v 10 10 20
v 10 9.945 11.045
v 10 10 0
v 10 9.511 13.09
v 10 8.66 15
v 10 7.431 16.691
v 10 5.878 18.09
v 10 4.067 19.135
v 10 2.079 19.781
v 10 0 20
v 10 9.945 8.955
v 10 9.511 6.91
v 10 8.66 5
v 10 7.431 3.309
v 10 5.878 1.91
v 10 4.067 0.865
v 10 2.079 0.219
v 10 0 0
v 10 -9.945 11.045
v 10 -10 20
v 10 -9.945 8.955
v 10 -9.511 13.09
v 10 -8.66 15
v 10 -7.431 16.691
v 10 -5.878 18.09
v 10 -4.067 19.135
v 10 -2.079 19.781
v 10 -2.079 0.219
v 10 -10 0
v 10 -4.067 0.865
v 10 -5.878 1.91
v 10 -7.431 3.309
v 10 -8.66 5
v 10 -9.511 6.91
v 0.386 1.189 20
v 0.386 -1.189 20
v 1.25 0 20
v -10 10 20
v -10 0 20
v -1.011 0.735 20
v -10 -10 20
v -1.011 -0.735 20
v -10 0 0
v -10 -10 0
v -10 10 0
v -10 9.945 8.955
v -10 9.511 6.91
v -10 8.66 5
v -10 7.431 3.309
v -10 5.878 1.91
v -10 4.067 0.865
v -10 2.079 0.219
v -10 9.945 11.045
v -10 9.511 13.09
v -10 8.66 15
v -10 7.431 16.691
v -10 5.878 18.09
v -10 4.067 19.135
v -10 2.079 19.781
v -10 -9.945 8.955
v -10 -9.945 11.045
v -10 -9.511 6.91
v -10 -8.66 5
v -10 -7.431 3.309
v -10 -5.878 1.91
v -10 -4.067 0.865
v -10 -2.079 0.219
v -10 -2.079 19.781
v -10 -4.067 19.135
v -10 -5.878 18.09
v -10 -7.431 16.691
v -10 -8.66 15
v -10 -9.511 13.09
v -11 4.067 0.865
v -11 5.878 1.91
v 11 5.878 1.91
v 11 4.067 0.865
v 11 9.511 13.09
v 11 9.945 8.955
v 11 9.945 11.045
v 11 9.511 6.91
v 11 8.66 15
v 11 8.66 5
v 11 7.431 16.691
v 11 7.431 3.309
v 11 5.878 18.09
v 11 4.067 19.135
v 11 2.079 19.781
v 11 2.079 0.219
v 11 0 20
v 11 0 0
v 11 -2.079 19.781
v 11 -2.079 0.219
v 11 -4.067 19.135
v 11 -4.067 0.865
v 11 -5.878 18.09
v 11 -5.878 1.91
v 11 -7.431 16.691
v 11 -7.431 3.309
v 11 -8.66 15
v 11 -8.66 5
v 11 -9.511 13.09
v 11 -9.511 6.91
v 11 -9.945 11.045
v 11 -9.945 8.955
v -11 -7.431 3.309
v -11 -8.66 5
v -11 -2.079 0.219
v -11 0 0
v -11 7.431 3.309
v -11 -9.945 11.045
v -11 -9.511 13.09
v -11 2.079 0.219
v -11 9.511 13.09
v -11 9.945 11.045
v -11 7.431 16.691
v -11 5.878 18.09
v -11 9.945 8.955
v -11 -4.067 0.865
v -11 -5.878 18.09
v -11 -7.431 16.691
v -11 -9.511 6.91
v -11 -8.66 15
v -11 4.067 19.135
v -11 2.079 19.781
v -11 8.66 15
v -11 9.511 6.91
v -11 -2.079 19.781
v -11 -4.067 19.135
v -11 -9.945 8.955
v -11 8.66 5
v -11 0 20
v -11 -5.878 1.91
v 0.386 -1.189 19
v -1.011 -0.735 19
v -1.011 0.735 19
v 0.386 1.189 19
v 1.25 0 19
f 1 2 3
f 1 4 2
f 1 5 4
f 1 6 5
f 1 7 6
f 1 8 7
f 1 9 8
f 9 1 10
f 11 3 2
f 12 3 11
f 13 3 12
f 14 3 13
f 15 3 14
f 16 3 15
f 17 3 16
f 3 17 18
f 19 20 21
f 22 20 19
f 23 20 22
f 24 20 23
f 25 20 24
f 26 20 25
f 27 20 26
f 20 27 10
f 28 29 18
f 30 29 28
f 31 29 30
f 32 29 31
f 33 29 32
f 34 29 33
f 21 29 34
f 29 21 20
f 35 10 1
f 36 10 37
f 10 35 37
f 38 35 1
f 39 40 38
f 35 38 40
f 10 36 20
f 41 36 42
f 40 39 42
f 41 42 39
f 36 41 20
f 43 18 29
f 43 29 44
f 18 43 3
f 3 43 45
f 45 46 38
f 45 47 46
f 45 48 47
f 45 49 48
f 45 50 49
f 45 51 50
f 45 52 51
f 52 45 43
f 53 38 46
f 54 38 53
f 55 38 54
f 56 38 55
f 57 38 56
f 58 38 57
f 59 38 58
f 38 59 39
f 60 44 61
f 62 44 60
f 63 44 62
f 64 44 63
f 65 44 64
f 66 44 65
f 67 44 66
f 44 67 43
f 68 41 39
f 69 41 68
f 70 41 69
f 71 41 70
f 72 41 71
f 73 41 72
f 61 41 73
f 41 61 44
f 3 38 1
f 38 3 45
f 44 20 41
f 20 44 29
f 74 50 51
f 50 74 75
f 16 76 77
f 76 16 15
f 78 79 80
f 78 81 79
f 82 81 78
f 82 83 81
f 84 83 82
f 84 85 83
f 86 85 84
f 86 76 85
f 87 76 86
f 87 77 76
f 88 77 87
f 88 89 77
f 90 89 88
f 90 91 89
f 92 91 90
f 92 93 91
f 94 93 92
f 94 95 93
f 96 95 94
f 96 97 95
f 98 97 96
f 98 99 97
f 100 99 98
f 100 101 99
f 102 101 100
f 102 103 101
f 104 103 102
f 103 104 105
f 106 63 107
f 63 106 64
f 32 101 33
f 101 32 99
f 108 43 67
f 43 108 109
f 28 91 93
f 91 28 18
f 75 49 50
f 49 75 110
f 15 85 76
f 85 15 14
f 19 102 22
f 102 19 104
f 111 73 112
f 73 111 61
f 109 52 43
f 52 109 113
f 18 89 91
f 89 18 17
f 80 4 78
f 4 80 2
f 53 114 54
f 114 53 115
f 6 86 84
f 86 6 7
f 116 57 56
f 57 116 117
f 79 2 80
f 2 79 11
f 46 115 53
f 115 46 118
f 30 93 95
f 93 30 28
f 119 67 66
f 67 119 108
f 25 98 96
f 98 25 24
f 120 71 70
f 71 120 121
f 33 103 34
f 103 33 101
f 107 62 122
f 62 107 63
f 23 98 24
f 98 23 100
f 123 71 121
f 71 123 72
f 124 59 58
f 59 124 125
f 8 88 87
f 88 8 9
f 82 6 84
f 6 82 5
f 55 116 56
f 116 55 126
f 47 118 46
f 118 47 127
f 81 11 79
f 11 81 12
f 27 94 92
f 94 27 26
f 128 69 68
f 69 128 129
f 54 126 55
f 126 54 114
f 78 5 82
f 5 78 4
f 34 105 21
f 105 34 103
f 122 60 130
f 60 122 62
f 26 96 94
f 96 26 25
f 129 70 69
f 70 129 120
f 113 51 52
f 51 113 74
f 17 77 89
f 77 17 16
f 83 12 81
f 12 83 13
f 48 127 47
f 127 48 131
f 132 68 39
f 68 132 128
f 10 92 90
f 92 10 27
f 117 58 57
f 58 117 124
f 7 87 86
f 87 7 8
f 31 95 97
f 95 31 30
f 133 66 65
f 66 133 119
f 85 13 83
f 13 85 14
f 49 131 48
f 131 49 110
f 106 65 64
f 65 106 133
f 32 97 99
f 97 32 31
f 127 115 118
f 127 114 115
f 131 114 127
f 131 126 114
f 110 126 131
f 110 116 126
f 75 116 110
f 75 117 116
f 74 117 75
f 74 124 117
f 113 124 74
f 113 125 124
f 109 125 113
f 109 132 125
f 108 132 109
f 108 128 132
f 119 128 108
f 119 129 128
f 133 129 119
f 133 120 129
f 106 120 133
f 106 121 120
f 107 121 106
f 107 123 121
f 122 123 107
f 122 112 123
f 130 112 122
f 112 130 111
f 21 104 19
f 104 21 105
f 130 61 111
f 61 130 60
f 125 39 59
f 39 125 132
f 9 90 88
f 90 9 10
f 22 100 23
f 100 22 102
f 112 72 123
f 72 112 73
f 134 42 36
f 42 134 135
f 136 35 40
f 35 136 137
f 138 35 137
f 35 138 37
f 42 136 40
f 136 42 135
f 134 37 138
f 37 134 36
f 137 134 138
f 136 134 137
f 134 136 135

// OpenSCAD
cube_size = 20; // [10:Small,20:Medium,30:Large]

hole_diameter = 2.5;
hole_radius = hole_diameter/2;

// How deep should the center hole be?
hole_depth = 1; // [0,1,5,50]

show_wheels = "yes"; // [yes,no]

// How thick should the side wheels be?
wheel_thickness = 1; // [1:20]

// ignore this variable!
// foo=1;

// don't turn functions into params!
function BEZ03(u) = pow((1-u), 3);

// ignore variable values
bing = 3+4;
baz = 3 / hole_depth;

difference() {
  union() {
    translate([0, 0, cube_size/2]) cube([cube_size,cube_size,cube_size], center=true);
    if (show_wheels == "yes") {
      translate([0, 0, cube_size/2]) rotate([0, 90, 0]) {
        cylinder(r=cube_size/2, h=cube_size+(wheel_thickness*2), center=true);
      }
    }
  }
  translate([0, 0, cube_size-hole_depth]) cylinder(r=hole_radius, h=hole_depth);
}          
